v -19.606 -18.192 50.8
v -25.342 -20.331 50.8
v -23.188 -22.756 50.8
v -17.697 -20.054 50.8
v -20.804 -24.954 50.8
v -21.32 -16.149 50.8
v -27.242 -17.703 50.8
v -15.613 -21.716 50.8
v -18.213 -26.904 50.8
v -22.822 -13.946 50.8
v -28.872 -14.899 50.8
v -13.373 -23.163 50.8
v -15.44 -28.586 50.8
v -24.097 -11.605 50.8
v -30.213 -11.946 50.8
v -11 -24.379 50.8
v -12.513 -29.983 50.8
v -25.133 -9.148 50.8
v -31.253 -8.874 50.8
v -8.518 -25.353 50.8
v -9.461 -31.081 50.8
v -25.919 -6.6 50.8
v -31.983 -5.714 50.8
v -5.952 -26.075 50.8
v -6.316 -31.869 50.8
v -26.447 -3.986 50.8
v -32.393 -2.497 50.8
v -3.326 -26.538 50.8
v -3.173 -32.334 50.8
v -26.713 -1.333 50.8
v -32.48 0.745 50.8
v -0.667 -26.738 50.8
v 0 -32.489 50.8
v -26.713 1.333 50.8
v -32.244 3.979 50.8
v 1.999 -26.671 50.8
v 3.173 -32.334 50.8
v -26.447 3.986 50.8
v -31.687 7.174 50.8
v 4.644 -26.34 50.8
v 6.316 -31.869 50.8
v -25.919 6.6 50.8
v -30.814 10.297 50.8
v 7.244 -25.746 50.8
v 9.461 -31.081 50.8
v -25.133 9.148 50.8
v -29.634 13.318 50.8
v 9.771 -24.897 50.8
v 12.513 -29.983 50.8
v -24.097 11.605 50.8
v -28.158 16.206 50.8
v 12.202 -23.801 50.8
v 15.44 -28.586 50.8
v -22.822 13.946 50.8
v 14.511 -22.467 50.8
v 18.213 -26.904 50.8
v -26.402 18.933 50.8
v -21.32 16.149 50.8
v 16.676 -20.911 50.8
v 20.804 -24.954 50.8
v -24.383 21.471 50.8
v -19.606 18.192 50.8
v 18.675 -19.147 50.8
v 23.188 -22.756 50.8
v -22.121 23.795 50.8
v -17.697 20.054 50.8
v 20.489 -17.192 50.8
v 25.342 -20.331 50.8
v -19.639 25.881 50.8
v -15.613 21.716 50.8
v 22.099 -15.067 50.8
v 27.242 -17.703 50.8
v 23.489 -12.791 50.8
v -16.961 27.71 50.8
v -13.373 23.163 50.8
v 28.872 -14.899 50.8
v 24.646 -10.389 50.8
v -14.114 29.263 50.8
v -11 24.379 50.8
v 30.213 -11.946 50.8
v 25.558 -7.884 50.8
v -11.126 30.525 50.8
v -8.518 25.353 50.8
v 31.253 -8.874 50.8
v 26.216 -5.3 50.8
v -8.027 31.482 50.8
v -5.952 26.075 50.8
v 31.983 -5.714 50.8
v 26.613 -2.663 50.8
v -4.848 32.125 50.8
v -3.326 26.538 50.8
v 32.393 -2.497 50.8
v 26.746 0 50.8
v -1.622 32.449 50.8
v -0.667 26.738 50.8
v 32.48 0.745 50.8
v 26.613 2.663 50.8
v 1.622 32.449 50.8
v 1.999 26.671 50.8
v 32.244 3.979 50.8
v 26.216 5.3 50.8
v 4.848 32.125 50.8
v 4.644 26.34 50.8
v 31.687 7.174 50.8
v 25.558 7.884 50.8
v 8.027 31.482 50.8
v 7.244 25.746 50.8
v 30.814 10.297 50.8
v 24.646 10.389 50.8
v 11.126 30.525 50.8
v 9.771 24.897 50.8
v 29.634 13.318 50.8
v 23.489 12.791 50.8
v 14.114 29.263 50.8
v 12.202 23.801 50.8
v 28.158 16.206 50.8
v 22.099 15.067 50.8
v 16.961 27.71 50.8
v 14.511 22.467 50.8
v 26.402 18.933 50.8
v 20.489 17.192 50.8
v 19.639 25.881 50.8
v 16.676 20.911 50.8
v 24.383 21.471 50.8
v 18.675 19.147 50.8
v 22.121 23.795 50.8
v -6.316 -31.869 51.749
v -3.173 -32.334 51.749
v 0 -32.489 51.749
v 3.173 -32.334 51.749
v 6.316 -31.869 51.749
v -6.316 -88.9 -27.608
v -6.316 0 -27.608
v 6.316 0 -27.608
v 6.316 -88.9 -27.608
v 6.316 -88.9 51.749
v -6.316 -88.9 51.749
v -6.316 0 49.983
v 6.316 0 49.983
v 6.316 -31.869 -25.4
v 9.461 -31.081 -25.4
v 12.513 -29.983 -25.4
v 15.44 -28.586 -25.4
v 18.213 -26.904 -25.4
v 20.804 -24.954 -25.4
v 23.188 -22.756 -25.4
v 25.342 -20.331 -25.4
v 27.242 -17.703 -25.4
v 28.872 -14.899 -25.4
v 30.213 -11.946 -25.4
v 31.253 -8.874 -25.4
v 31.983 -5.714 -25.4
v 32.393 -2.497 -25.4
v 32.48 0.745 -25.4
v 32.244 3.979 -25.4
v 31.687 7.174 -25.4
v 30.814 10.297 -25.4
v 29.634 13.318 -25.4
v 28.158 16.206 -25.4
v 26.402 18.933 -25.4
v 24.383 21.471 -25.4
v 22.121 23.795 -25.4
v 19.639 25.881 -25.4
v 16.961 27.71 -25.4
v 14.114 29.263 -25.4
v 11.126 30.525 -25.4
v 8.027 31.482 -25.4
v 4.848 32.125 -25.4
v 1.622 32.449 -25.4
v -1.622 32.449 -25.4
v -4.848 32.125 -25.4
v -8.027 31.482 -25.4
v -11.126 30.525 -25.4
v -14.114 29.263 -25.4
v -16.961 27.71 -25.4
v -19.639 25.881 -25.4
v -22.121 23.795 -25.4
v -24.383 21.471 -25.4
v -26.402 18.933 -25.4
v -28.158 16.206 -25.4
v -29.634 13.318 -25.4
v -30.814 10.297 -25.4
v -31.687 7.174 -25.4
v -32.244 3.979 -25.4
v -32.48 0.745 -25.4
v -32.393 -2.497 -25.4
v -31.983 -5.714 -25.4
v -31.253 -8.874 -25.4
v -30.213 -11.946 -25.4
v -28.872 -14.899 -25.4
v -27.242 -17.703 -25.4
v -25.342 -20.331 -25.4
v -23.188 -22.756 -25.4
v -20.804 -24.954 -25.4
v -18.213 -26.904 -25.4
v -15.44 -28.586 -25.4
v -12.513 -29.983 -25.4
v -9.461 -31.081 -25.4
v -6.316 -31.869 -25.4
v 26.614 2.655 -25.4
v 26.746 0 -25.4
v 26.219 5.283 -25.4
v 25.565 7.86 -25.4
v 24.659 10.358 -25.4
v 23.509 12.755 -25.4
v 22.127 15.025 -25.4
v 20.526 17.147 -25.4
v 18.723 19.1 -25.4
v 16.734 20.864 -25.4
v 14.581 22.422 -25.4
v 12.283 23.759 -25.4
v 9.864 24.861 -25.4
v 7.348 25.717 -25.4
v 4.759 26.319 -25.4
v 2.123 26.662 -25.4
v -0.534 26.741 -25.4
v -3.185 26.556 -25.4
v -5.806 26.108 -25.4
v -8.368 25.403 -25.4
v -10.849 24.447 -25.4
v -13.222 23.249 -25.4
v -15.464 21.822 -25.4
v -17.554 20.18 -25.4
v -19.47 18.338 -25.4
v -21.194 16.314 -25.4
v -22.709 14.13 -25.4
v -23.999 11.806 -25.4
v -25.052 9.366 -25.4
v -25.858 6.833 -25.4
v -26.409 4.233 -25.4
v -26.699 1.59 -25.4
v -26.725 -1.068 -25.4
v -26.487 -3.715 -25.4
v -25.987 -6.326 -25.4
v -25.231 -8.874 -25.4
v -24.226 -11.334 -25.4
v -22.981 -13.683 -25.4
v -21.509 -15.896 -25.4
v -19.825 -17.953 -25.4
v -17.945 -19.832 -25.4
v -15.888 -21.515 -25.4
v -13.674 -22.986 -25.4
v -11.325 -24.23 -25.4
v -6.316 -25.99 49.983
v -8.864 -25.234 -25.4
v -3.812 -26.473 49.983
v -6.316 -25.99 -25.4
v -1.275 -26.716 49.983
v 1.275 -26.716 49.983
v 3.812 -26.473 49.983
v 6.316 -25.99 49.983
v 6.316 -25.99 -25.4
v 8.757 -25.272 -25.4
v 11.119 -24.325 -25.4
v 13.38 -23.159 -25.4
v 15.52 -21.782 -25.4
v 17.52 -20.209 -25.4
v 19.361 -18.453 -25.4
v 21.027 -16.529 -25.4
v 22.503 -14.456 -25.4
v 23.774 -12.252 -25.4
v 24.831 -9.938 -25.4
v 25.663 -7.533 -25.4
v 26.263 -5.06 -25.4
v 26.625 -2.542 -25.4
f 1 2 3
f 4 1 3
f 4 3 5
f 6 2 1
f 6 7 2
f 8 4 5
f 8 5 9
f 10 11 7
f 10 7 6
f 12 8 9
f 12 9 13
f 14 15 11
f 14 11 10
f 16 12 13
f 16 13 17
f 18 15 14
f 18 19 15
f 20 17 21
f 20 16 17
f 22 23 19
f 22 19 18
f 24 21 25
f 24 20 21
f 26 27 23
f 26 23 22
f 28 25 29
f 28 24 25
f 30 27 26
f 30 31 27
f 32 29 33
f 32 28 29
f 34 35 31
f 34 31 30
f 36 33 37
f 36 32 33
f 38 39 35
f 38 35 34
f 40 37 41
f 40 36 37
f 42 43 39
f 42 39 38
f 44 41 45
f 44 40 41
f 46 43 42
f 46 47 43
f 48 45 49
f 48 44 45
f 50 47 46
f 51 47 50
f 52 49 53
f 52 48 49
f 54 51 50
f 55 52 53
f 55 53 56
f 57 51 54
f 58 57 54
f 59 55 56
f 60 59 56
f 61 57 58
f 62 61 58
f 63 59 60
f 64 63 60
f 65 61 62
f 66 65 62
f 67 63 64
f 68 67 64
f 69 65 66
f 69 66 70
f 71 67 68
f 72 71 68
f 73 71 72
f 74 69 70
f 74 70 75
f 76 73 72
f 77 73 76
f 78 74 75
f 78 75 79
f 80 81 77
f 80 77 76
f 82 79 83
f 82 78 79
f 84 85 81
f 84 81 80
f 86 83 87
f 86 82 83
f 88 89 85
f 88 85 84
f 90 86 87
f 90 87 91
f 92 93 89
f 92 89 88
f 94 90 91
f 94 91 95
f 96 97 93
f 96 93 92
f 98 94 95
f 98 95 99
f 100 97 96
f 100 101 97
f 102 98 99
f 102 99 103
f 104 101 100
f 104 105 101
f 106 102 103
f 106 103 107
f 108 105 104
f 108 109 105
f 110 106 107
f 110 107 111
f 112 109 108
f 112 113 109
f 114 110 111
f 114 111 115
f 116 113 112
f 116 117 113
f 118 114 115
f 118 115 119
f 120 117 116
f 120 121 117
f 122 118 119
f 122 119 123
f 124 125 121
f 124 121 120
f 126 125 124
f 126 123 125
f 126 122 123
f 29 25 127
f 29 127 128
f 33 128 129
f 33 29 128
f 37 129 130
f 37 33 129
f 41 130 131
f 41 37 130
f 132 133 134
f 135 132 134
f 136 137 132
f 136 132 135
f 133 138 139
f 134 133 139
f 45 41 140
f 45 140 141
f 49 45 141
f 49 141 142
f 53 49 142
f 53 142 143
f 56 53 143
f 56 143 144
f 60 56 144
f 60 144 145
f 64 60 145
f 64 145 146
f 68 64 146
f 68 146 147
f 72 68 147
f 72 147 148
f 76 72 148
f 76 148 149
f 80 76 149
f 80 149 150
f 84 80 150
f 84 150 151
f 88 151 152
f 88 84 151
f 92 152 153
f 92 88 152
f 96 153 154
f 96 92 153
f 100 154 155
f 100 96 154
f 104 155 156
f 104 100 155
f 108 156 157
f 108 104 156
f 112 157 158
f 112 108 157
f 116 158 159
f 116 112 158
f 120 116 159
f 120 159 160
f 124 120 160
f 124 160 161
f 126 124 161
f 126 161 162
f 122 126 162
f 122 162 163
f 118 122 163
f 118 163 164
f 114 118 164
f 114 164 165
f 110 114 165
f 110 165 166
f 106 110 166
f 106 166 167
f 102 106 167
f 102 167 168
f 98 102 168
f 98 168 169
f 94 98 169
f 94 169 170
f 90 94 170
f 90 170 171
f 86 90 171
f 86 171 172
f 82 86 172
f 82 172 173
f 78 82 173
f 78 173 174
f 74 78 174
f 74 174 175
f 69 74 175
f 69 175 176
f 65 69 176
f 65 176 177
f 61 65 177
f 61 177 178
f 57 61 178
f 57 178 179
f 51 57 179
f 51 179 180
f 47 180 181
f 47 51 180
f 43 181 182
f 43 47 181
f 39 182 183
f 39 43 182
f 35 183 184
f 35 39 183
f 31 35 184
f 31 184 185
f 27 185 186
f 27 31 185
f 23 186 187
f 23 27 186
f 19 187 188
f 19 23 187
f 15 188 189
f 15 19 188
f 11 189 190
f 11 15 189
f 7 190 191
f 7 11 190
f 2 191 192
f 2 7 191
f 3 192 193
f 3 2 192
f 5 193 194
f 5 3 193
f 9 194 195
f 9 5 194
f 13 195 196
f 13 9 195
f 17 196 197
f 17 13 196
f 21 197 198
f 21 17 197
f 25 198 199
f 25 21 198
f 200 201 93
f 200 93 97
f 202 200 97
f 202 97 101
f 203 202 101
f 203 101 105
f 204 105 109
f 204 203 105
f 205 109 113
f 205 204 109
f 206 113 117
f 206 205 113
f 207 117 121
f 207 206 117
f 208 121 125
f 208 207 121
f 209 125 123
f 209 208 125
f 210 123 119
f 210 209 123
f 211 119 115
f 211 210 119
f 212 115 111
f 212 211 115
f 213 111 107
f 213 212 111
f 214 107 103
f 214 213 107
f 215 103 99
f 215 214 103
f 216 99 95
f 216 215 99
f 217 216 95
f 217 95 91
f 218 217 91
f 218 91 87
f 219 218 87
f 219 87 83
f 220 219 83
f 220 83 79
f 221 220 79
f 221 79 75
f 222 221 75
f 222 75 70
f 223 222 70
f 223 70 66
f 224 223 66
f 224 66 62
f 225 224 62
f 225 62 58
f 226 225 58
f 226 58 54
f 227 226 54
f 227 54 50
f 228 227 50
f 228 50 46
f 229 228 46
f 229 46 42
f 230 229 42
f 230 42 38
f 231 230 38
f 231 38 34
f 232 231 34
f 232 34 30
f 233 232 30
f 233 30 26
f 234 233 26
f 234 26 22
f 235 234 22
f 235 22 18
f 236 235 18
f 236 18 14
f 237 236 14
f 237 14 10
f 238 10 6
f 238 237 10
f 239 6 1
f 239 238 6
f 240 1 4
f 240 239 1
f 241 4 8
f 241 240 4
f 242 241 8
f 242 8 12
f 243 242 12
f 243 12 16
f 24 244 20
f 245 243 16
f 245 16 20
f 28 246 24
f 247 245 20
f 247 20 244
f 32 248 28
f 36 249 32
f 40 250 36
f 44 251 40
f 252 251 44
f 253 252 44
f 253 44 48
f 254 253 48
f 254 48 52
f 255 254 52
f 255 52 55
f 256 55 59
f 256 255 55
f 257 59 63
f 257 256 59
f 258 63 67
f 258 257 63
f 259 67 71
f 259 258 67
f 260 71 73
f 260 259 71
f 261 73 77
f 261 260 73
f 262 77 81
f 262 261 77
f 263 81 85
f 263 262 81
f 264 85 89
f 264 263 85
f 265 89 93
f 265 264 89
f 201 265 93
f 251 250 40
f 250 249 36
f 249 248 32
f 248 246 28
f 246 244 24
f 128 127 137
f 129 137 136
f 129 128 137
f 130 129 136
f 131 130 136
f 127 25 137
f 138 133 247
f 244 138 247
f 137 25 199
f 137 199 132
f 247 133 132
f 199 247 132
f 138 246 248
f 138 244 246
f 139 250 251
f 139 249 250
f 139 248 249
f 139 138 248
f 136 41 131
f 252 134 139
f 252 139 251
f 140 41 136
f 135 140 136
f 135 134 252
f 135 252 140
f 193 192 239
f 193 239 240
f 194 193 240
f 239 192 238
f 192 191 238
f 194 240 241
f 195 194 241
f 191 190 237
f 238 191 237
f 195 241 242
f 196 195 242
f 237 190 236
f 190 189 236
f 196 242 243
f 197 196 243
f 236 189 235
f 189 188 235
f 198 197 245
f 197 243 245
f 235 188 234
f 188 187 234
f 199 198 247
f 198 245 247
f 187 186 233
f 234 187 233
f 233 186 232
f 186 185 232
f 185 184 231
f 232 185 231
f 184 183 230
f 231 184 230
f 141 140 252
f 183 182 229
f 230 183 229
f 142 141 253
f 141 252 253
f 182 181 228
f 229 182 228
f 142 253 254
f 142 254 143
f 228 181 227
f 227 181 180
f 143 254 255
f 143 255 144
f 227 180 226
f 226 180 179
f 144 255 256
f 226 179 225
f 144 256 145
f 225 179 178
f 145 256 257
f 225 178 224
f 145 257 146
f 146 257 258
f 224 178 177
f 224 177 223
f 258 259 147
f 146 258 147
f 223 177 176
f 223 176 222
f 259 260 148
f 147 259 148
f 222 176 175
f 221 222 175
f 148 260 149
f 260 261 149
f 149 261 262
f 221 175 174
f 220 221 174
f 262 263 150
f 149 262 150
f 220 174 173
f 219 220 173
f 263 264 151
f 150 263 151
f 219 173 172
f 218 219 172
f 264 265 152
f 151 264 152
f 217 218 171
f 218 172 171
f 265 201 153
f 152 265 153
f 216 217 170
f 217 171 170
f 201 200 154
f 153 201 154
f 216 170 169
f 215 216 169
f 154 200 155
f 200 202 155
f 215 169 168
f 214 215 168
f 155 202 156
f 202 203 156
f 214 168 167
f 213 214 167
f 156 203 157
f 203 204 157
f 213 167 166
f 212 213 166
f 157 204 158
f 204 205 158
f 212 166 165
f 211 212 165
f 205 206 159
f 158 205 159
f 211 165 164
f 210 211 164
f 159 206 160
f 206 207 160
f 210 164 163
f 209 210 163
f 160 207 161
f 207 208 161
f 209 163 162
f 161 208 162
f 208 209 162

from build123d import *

# Parameters (mm, degrees)
F0_R     = 32.4890265079
F0_R_2   = 26.7459939795
F1_DEPTH = 50.8
F2_DEPTH = 25.4
F3_W     = 12.6311182976
F3_H     = 77.5911509991
F4_DEPTH = 88.9
F5_DEPTH = 1.7660884187


with BuildPart() as f1:
    # F0 (on Top) → F1 (new body)
    with BuildSketch(Plane.XY):
        Circle(F0_R)
        Circle(F0_R_2, mode=Mode.SUBTRACT)
    extrude(amount=F1_DEPTH)

    # F2 (add): a face of the model
    f2_faces = [f1.faces().sort_by_distance(p)[0] for p in [
        (-31.5700980696, 0, 0),
    ]]
    extrude(f2_faces, amount=F2_DEPTH)

    # F3 (on Front) → F4 (join)
    with BuildSketch(Plane.XZ):
        with Locations((0, 11.1875087023)):
            Rectangle(F3_W, F3_H)
    extrude(amount=F4_DEPTH)

    # F5 (add): a face of the model
    f5_faces = [f1.faces().sort_by_distance(p)[0] for p in [
        (0, -60.5913176327, 49.9830842018),
    ]]
    extrude(f5_faces, amount=F5_DEPTH)


solid = f1.part
